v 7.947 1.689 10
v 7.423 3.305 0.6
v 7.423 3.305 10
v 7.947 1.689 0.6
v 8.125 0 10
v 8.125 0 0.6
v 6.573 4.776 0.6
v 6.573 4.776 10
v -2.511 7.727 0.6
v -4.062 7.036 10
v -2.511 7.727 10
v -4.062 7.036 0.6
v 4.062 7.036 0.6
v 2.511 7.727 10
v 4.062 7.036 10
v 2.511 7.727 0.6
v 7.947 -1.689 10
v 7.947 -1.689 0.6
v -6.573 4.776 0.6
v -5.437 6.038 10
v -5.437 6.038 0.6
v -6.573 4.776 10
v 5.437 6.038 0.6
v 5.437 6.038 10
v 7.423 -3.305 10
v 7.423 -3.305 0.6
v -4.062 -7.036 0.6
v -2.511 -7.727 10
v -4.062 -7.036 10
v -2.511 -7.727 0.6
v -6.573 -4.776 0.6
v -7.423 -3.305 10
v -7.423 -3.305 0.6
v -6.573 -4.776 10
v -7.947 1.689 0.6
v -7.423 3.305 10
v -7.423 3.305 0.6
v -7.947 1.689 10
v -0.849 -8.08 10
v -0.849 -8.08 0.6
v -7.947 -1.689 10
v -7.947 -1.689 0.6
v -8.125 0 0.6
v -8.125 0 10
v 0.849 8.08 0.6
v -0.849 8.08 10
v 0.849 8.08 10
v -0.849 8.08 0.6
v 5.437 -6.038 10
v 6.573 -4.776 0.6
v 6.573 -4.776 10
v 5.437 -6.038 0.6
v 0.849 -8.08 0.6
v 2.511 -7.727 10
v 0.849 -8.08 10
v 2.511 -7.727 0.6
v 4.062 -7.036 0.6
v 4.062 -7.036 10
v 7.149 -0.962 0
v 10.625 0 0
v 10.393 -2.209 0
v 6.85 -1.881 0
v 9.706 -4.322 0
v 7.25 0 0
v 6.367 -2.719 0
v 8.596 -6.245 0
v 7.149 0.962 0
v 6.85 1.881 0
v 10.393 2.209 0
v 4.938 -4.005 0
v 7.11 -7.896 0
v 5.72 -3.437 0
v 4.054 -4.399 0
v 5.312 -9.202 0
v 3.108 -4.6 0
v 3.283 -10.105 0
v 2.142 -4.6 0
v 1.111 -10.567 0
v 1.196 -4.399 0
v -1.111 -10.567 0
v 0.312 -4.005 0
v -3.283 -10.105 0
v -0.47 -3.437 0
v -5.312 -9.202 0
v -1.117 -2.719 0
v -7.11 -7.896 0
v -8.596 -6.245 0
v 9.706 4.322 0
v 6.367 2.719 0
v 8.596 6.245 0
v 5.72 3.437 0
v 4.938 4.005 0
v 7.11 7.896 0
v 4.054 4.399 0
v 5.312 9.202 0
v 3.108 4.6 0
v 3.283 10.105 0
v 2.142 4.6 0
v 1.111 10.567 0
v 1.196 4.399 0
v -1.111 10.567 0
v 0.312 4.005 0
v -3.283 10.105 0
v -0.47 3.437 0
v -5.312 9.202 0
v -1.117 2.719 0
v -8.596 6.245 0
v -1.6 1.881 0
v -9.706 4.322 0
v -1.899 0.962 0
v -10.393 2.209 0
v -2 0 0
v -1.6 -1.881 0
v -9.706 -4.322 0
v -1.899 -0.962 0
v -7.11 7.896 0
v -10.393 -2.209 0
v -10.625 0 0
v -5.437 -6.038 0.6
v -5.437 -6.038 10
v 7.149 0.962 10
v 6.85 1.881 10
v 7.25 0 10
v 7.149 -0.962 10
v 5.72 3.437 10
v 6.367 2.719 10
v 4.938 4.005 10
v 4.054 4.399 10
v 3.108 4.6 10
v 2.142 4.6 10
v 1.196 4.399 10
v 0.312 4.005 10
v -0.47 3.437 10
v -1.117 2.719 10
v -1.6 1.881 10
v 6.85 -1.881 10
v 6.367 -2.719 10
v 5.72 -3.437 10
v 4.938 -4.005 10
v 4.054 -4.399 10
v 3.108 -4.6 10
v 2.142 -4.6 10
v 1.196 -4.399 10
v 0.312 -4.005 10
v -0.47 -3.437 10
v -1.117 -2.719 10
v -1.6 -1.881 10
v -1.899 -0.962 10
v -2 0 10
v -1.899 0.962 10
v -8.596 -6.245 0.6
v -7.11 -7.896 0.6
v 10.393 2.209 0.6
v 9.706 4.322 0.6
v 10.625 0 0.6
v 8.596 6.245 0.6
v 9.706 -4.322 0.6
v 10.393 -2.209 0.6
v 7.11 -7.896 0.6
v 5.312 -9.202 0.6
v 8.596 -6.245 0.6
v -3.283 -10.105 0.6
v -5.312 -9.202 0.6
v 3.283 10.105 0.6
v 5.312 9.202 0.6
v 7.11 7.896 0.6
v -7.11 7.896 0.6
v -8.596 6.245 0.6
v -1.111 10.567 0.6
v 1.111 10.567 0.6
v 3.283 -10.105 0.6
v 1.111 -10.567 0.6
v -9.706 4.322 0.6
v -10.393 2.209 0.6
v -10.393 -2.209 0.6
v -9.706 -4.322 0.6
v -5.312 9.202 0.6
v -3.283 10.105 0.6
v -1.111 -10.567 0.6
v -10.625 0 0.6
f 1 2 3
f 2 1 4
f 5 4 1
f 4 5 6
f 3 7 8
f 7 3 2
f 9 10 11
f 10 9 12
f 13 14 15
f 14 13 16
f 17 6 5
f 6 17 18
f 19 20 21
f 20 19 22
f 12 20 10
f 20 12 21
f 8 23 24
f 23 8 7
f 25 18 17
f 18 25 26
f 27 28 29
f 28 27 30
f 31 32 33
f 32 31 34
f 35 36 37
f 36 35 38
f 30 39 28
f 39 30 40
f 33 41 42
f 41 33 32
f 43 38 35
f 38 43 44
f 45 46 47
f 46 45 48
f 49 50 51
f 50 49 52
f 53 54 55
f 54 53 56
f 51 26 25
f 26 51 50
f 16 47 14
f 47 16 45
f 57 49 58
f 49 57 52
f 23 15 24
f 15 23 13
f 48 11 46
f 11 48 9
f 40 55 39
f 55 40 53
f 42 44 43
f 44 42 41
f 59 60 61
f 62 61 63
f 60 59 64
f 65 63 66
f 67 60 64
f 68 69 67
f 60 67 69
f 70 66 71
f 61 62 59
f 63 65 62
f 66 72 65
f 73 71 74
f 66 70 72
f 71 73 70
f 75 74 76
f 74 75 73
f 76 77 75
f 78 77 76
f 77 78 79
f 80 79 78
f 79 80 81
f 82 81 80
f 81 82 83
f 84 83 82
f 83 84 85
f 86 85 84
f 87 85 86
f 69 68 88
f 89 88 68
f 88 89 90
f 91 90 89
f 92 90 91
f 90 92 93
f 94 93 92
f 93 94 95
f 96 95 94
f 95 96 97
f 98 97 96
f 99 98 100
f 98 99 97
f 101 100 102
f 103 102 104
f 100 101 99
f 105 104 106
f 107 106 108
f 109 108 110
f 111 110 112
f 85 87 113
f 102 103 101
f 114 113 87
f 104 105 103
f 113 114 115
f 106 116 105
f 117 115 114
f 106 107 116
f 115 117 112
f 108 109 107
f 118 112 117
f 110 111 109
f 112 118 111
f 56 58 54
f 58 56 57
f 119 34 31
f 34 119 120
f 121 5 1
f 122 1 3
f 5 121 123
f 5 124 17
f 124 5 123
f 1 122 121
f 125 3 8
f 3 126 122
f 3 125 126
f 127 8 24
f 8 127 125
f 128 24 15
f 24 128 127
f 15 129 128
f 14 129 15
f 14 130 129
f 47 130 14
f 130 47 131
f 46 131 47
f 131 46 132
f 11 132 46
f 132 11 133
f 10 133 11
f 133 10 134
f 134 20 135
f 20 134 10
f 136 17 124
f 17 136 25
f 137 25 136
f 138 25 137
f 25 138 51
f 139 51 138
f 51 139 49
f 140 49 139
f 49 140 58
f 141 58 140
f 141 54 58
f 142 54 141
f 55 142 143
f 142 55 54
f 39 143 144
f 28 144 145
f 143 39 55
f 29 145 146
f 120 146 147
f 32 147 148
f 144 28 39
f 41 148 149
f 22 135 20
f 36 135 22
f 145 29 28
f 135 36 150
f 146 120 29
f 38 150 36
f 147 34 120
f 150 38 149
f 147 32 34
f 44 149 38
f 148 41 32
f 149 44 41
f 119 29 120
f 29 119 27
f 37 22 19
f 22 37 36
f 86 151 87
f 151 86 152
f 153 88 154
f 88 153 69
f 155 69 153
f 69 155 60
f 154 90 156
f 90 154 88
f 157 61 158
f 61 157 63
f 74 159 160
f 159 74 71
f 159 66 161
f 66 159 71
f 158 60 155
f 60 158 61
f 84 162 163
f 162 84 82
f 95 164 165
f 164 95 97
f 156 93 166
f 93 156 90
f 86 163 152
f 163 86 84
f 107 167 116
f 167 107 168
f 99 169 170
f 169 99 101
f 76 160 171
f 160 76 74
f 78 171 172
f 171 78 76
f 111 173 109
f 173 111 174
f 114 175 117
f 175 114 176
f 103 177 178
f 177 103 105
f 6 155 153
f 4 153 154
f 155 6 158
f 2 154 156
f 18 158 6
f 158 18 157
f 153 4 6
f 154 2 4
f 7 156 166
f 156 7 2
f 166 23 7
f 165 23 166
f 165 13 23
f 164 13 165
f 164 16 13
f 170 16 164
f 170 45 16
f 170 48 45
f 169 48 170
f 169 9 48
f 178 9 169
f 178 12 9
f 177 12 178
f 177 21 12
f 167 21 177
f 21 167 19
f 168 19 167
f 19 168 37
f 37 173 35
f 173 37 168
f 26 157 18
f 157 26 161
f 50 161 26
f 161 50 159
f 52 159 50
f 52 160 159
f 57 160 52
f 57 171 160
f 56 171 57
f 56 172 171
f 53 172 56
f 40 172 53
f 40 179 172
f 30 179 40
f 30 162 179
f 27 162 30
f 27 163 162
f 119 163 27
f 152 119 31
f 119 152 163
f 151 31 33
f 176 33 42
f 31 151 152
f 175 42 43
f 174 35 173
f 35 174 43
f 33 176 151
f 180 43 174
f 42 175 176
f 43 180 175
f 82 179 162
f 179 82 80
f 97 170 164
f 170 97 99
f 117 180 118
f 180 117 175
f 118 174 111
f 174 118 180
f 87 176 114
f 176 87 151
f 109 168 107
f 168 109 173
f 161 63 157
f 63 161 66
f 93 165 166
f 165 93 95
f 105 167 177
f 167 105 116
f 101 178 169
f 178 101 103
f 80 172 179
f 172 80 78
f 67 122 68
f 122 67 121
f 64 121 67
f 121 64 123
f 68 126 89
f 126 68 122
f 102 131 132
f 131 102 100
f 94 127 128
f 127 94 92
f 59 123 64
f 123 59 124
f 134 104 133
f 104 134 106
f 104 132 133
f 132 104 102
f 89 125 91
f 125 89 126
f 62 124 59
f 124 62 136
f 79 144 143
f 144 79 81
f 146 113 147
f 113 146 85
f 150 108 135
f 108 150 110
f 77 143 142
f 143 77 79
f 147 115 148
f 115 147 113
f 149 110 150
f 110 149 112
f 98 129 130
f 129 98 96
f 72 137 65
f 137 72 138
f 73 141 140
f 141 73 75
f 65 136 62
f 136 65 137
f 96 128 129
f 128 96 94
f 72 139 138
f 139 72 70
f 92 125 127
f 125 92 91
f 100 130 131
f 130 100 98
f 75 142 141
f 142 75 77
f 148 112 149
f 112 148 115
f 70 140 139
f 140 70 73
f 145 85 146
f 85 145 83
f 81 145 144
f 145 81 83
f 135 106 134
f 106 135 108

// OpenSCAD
/*
Toilet seat wobble fixer
This bushing shims the bolt to the toilet so the seat won't wiggle so bad

Mike Creuzer - Mike@Creuzer.com - 2012-08-23
Update 2012-12-23 Added offset to allow for elliptical usage for seats that don't exactly align to the center of the stool's holes.
Update 2013-01-14 Tweaked parameter names for customizer

Measurements are dimensionless but assumed to be in mm for most programs.
*/

//Toilet measurement - maybe make this a bit short if your nut is convex
hole_depth = 10;
//Toilet measurement
hole_width = 16.25;

// Bolt measurement
bolt_width = 9.25;

// Part Measurement - Make this a couple of layers for your printer for good results.
brim_height = 0.6; 
// Part Measurement - Shoulder so the shim won't fall out of the hole.
brim_width = 5;
//Percentage to offset the center hole from center.
hole_offset = 75; //  [0:100]
offset = hole_offset * 0.01;
// (factor * by .02) 2 is the default for fast rendering, .01 is as good as it gets. 
curve_quality_percentage = 0.5; // [.5:100]
curve_quality = curve_quality_percentage * .02;

difference()
{
	union()
	{
		cylinder(r = hole_width / 2, h=hole_depth, $fs = curve_quality); // The shim
		cylinder(r = (hole_width + brim_width) / 2, h=brim_height); // the shoulder
	}
	translate(v = [offset * ((hole_width-bolt_width) / 2), 0, 0]) cylinder(r = bolt_width / 2, h=hole_depth, $fs = curve_quality); // The bolt hole
}
